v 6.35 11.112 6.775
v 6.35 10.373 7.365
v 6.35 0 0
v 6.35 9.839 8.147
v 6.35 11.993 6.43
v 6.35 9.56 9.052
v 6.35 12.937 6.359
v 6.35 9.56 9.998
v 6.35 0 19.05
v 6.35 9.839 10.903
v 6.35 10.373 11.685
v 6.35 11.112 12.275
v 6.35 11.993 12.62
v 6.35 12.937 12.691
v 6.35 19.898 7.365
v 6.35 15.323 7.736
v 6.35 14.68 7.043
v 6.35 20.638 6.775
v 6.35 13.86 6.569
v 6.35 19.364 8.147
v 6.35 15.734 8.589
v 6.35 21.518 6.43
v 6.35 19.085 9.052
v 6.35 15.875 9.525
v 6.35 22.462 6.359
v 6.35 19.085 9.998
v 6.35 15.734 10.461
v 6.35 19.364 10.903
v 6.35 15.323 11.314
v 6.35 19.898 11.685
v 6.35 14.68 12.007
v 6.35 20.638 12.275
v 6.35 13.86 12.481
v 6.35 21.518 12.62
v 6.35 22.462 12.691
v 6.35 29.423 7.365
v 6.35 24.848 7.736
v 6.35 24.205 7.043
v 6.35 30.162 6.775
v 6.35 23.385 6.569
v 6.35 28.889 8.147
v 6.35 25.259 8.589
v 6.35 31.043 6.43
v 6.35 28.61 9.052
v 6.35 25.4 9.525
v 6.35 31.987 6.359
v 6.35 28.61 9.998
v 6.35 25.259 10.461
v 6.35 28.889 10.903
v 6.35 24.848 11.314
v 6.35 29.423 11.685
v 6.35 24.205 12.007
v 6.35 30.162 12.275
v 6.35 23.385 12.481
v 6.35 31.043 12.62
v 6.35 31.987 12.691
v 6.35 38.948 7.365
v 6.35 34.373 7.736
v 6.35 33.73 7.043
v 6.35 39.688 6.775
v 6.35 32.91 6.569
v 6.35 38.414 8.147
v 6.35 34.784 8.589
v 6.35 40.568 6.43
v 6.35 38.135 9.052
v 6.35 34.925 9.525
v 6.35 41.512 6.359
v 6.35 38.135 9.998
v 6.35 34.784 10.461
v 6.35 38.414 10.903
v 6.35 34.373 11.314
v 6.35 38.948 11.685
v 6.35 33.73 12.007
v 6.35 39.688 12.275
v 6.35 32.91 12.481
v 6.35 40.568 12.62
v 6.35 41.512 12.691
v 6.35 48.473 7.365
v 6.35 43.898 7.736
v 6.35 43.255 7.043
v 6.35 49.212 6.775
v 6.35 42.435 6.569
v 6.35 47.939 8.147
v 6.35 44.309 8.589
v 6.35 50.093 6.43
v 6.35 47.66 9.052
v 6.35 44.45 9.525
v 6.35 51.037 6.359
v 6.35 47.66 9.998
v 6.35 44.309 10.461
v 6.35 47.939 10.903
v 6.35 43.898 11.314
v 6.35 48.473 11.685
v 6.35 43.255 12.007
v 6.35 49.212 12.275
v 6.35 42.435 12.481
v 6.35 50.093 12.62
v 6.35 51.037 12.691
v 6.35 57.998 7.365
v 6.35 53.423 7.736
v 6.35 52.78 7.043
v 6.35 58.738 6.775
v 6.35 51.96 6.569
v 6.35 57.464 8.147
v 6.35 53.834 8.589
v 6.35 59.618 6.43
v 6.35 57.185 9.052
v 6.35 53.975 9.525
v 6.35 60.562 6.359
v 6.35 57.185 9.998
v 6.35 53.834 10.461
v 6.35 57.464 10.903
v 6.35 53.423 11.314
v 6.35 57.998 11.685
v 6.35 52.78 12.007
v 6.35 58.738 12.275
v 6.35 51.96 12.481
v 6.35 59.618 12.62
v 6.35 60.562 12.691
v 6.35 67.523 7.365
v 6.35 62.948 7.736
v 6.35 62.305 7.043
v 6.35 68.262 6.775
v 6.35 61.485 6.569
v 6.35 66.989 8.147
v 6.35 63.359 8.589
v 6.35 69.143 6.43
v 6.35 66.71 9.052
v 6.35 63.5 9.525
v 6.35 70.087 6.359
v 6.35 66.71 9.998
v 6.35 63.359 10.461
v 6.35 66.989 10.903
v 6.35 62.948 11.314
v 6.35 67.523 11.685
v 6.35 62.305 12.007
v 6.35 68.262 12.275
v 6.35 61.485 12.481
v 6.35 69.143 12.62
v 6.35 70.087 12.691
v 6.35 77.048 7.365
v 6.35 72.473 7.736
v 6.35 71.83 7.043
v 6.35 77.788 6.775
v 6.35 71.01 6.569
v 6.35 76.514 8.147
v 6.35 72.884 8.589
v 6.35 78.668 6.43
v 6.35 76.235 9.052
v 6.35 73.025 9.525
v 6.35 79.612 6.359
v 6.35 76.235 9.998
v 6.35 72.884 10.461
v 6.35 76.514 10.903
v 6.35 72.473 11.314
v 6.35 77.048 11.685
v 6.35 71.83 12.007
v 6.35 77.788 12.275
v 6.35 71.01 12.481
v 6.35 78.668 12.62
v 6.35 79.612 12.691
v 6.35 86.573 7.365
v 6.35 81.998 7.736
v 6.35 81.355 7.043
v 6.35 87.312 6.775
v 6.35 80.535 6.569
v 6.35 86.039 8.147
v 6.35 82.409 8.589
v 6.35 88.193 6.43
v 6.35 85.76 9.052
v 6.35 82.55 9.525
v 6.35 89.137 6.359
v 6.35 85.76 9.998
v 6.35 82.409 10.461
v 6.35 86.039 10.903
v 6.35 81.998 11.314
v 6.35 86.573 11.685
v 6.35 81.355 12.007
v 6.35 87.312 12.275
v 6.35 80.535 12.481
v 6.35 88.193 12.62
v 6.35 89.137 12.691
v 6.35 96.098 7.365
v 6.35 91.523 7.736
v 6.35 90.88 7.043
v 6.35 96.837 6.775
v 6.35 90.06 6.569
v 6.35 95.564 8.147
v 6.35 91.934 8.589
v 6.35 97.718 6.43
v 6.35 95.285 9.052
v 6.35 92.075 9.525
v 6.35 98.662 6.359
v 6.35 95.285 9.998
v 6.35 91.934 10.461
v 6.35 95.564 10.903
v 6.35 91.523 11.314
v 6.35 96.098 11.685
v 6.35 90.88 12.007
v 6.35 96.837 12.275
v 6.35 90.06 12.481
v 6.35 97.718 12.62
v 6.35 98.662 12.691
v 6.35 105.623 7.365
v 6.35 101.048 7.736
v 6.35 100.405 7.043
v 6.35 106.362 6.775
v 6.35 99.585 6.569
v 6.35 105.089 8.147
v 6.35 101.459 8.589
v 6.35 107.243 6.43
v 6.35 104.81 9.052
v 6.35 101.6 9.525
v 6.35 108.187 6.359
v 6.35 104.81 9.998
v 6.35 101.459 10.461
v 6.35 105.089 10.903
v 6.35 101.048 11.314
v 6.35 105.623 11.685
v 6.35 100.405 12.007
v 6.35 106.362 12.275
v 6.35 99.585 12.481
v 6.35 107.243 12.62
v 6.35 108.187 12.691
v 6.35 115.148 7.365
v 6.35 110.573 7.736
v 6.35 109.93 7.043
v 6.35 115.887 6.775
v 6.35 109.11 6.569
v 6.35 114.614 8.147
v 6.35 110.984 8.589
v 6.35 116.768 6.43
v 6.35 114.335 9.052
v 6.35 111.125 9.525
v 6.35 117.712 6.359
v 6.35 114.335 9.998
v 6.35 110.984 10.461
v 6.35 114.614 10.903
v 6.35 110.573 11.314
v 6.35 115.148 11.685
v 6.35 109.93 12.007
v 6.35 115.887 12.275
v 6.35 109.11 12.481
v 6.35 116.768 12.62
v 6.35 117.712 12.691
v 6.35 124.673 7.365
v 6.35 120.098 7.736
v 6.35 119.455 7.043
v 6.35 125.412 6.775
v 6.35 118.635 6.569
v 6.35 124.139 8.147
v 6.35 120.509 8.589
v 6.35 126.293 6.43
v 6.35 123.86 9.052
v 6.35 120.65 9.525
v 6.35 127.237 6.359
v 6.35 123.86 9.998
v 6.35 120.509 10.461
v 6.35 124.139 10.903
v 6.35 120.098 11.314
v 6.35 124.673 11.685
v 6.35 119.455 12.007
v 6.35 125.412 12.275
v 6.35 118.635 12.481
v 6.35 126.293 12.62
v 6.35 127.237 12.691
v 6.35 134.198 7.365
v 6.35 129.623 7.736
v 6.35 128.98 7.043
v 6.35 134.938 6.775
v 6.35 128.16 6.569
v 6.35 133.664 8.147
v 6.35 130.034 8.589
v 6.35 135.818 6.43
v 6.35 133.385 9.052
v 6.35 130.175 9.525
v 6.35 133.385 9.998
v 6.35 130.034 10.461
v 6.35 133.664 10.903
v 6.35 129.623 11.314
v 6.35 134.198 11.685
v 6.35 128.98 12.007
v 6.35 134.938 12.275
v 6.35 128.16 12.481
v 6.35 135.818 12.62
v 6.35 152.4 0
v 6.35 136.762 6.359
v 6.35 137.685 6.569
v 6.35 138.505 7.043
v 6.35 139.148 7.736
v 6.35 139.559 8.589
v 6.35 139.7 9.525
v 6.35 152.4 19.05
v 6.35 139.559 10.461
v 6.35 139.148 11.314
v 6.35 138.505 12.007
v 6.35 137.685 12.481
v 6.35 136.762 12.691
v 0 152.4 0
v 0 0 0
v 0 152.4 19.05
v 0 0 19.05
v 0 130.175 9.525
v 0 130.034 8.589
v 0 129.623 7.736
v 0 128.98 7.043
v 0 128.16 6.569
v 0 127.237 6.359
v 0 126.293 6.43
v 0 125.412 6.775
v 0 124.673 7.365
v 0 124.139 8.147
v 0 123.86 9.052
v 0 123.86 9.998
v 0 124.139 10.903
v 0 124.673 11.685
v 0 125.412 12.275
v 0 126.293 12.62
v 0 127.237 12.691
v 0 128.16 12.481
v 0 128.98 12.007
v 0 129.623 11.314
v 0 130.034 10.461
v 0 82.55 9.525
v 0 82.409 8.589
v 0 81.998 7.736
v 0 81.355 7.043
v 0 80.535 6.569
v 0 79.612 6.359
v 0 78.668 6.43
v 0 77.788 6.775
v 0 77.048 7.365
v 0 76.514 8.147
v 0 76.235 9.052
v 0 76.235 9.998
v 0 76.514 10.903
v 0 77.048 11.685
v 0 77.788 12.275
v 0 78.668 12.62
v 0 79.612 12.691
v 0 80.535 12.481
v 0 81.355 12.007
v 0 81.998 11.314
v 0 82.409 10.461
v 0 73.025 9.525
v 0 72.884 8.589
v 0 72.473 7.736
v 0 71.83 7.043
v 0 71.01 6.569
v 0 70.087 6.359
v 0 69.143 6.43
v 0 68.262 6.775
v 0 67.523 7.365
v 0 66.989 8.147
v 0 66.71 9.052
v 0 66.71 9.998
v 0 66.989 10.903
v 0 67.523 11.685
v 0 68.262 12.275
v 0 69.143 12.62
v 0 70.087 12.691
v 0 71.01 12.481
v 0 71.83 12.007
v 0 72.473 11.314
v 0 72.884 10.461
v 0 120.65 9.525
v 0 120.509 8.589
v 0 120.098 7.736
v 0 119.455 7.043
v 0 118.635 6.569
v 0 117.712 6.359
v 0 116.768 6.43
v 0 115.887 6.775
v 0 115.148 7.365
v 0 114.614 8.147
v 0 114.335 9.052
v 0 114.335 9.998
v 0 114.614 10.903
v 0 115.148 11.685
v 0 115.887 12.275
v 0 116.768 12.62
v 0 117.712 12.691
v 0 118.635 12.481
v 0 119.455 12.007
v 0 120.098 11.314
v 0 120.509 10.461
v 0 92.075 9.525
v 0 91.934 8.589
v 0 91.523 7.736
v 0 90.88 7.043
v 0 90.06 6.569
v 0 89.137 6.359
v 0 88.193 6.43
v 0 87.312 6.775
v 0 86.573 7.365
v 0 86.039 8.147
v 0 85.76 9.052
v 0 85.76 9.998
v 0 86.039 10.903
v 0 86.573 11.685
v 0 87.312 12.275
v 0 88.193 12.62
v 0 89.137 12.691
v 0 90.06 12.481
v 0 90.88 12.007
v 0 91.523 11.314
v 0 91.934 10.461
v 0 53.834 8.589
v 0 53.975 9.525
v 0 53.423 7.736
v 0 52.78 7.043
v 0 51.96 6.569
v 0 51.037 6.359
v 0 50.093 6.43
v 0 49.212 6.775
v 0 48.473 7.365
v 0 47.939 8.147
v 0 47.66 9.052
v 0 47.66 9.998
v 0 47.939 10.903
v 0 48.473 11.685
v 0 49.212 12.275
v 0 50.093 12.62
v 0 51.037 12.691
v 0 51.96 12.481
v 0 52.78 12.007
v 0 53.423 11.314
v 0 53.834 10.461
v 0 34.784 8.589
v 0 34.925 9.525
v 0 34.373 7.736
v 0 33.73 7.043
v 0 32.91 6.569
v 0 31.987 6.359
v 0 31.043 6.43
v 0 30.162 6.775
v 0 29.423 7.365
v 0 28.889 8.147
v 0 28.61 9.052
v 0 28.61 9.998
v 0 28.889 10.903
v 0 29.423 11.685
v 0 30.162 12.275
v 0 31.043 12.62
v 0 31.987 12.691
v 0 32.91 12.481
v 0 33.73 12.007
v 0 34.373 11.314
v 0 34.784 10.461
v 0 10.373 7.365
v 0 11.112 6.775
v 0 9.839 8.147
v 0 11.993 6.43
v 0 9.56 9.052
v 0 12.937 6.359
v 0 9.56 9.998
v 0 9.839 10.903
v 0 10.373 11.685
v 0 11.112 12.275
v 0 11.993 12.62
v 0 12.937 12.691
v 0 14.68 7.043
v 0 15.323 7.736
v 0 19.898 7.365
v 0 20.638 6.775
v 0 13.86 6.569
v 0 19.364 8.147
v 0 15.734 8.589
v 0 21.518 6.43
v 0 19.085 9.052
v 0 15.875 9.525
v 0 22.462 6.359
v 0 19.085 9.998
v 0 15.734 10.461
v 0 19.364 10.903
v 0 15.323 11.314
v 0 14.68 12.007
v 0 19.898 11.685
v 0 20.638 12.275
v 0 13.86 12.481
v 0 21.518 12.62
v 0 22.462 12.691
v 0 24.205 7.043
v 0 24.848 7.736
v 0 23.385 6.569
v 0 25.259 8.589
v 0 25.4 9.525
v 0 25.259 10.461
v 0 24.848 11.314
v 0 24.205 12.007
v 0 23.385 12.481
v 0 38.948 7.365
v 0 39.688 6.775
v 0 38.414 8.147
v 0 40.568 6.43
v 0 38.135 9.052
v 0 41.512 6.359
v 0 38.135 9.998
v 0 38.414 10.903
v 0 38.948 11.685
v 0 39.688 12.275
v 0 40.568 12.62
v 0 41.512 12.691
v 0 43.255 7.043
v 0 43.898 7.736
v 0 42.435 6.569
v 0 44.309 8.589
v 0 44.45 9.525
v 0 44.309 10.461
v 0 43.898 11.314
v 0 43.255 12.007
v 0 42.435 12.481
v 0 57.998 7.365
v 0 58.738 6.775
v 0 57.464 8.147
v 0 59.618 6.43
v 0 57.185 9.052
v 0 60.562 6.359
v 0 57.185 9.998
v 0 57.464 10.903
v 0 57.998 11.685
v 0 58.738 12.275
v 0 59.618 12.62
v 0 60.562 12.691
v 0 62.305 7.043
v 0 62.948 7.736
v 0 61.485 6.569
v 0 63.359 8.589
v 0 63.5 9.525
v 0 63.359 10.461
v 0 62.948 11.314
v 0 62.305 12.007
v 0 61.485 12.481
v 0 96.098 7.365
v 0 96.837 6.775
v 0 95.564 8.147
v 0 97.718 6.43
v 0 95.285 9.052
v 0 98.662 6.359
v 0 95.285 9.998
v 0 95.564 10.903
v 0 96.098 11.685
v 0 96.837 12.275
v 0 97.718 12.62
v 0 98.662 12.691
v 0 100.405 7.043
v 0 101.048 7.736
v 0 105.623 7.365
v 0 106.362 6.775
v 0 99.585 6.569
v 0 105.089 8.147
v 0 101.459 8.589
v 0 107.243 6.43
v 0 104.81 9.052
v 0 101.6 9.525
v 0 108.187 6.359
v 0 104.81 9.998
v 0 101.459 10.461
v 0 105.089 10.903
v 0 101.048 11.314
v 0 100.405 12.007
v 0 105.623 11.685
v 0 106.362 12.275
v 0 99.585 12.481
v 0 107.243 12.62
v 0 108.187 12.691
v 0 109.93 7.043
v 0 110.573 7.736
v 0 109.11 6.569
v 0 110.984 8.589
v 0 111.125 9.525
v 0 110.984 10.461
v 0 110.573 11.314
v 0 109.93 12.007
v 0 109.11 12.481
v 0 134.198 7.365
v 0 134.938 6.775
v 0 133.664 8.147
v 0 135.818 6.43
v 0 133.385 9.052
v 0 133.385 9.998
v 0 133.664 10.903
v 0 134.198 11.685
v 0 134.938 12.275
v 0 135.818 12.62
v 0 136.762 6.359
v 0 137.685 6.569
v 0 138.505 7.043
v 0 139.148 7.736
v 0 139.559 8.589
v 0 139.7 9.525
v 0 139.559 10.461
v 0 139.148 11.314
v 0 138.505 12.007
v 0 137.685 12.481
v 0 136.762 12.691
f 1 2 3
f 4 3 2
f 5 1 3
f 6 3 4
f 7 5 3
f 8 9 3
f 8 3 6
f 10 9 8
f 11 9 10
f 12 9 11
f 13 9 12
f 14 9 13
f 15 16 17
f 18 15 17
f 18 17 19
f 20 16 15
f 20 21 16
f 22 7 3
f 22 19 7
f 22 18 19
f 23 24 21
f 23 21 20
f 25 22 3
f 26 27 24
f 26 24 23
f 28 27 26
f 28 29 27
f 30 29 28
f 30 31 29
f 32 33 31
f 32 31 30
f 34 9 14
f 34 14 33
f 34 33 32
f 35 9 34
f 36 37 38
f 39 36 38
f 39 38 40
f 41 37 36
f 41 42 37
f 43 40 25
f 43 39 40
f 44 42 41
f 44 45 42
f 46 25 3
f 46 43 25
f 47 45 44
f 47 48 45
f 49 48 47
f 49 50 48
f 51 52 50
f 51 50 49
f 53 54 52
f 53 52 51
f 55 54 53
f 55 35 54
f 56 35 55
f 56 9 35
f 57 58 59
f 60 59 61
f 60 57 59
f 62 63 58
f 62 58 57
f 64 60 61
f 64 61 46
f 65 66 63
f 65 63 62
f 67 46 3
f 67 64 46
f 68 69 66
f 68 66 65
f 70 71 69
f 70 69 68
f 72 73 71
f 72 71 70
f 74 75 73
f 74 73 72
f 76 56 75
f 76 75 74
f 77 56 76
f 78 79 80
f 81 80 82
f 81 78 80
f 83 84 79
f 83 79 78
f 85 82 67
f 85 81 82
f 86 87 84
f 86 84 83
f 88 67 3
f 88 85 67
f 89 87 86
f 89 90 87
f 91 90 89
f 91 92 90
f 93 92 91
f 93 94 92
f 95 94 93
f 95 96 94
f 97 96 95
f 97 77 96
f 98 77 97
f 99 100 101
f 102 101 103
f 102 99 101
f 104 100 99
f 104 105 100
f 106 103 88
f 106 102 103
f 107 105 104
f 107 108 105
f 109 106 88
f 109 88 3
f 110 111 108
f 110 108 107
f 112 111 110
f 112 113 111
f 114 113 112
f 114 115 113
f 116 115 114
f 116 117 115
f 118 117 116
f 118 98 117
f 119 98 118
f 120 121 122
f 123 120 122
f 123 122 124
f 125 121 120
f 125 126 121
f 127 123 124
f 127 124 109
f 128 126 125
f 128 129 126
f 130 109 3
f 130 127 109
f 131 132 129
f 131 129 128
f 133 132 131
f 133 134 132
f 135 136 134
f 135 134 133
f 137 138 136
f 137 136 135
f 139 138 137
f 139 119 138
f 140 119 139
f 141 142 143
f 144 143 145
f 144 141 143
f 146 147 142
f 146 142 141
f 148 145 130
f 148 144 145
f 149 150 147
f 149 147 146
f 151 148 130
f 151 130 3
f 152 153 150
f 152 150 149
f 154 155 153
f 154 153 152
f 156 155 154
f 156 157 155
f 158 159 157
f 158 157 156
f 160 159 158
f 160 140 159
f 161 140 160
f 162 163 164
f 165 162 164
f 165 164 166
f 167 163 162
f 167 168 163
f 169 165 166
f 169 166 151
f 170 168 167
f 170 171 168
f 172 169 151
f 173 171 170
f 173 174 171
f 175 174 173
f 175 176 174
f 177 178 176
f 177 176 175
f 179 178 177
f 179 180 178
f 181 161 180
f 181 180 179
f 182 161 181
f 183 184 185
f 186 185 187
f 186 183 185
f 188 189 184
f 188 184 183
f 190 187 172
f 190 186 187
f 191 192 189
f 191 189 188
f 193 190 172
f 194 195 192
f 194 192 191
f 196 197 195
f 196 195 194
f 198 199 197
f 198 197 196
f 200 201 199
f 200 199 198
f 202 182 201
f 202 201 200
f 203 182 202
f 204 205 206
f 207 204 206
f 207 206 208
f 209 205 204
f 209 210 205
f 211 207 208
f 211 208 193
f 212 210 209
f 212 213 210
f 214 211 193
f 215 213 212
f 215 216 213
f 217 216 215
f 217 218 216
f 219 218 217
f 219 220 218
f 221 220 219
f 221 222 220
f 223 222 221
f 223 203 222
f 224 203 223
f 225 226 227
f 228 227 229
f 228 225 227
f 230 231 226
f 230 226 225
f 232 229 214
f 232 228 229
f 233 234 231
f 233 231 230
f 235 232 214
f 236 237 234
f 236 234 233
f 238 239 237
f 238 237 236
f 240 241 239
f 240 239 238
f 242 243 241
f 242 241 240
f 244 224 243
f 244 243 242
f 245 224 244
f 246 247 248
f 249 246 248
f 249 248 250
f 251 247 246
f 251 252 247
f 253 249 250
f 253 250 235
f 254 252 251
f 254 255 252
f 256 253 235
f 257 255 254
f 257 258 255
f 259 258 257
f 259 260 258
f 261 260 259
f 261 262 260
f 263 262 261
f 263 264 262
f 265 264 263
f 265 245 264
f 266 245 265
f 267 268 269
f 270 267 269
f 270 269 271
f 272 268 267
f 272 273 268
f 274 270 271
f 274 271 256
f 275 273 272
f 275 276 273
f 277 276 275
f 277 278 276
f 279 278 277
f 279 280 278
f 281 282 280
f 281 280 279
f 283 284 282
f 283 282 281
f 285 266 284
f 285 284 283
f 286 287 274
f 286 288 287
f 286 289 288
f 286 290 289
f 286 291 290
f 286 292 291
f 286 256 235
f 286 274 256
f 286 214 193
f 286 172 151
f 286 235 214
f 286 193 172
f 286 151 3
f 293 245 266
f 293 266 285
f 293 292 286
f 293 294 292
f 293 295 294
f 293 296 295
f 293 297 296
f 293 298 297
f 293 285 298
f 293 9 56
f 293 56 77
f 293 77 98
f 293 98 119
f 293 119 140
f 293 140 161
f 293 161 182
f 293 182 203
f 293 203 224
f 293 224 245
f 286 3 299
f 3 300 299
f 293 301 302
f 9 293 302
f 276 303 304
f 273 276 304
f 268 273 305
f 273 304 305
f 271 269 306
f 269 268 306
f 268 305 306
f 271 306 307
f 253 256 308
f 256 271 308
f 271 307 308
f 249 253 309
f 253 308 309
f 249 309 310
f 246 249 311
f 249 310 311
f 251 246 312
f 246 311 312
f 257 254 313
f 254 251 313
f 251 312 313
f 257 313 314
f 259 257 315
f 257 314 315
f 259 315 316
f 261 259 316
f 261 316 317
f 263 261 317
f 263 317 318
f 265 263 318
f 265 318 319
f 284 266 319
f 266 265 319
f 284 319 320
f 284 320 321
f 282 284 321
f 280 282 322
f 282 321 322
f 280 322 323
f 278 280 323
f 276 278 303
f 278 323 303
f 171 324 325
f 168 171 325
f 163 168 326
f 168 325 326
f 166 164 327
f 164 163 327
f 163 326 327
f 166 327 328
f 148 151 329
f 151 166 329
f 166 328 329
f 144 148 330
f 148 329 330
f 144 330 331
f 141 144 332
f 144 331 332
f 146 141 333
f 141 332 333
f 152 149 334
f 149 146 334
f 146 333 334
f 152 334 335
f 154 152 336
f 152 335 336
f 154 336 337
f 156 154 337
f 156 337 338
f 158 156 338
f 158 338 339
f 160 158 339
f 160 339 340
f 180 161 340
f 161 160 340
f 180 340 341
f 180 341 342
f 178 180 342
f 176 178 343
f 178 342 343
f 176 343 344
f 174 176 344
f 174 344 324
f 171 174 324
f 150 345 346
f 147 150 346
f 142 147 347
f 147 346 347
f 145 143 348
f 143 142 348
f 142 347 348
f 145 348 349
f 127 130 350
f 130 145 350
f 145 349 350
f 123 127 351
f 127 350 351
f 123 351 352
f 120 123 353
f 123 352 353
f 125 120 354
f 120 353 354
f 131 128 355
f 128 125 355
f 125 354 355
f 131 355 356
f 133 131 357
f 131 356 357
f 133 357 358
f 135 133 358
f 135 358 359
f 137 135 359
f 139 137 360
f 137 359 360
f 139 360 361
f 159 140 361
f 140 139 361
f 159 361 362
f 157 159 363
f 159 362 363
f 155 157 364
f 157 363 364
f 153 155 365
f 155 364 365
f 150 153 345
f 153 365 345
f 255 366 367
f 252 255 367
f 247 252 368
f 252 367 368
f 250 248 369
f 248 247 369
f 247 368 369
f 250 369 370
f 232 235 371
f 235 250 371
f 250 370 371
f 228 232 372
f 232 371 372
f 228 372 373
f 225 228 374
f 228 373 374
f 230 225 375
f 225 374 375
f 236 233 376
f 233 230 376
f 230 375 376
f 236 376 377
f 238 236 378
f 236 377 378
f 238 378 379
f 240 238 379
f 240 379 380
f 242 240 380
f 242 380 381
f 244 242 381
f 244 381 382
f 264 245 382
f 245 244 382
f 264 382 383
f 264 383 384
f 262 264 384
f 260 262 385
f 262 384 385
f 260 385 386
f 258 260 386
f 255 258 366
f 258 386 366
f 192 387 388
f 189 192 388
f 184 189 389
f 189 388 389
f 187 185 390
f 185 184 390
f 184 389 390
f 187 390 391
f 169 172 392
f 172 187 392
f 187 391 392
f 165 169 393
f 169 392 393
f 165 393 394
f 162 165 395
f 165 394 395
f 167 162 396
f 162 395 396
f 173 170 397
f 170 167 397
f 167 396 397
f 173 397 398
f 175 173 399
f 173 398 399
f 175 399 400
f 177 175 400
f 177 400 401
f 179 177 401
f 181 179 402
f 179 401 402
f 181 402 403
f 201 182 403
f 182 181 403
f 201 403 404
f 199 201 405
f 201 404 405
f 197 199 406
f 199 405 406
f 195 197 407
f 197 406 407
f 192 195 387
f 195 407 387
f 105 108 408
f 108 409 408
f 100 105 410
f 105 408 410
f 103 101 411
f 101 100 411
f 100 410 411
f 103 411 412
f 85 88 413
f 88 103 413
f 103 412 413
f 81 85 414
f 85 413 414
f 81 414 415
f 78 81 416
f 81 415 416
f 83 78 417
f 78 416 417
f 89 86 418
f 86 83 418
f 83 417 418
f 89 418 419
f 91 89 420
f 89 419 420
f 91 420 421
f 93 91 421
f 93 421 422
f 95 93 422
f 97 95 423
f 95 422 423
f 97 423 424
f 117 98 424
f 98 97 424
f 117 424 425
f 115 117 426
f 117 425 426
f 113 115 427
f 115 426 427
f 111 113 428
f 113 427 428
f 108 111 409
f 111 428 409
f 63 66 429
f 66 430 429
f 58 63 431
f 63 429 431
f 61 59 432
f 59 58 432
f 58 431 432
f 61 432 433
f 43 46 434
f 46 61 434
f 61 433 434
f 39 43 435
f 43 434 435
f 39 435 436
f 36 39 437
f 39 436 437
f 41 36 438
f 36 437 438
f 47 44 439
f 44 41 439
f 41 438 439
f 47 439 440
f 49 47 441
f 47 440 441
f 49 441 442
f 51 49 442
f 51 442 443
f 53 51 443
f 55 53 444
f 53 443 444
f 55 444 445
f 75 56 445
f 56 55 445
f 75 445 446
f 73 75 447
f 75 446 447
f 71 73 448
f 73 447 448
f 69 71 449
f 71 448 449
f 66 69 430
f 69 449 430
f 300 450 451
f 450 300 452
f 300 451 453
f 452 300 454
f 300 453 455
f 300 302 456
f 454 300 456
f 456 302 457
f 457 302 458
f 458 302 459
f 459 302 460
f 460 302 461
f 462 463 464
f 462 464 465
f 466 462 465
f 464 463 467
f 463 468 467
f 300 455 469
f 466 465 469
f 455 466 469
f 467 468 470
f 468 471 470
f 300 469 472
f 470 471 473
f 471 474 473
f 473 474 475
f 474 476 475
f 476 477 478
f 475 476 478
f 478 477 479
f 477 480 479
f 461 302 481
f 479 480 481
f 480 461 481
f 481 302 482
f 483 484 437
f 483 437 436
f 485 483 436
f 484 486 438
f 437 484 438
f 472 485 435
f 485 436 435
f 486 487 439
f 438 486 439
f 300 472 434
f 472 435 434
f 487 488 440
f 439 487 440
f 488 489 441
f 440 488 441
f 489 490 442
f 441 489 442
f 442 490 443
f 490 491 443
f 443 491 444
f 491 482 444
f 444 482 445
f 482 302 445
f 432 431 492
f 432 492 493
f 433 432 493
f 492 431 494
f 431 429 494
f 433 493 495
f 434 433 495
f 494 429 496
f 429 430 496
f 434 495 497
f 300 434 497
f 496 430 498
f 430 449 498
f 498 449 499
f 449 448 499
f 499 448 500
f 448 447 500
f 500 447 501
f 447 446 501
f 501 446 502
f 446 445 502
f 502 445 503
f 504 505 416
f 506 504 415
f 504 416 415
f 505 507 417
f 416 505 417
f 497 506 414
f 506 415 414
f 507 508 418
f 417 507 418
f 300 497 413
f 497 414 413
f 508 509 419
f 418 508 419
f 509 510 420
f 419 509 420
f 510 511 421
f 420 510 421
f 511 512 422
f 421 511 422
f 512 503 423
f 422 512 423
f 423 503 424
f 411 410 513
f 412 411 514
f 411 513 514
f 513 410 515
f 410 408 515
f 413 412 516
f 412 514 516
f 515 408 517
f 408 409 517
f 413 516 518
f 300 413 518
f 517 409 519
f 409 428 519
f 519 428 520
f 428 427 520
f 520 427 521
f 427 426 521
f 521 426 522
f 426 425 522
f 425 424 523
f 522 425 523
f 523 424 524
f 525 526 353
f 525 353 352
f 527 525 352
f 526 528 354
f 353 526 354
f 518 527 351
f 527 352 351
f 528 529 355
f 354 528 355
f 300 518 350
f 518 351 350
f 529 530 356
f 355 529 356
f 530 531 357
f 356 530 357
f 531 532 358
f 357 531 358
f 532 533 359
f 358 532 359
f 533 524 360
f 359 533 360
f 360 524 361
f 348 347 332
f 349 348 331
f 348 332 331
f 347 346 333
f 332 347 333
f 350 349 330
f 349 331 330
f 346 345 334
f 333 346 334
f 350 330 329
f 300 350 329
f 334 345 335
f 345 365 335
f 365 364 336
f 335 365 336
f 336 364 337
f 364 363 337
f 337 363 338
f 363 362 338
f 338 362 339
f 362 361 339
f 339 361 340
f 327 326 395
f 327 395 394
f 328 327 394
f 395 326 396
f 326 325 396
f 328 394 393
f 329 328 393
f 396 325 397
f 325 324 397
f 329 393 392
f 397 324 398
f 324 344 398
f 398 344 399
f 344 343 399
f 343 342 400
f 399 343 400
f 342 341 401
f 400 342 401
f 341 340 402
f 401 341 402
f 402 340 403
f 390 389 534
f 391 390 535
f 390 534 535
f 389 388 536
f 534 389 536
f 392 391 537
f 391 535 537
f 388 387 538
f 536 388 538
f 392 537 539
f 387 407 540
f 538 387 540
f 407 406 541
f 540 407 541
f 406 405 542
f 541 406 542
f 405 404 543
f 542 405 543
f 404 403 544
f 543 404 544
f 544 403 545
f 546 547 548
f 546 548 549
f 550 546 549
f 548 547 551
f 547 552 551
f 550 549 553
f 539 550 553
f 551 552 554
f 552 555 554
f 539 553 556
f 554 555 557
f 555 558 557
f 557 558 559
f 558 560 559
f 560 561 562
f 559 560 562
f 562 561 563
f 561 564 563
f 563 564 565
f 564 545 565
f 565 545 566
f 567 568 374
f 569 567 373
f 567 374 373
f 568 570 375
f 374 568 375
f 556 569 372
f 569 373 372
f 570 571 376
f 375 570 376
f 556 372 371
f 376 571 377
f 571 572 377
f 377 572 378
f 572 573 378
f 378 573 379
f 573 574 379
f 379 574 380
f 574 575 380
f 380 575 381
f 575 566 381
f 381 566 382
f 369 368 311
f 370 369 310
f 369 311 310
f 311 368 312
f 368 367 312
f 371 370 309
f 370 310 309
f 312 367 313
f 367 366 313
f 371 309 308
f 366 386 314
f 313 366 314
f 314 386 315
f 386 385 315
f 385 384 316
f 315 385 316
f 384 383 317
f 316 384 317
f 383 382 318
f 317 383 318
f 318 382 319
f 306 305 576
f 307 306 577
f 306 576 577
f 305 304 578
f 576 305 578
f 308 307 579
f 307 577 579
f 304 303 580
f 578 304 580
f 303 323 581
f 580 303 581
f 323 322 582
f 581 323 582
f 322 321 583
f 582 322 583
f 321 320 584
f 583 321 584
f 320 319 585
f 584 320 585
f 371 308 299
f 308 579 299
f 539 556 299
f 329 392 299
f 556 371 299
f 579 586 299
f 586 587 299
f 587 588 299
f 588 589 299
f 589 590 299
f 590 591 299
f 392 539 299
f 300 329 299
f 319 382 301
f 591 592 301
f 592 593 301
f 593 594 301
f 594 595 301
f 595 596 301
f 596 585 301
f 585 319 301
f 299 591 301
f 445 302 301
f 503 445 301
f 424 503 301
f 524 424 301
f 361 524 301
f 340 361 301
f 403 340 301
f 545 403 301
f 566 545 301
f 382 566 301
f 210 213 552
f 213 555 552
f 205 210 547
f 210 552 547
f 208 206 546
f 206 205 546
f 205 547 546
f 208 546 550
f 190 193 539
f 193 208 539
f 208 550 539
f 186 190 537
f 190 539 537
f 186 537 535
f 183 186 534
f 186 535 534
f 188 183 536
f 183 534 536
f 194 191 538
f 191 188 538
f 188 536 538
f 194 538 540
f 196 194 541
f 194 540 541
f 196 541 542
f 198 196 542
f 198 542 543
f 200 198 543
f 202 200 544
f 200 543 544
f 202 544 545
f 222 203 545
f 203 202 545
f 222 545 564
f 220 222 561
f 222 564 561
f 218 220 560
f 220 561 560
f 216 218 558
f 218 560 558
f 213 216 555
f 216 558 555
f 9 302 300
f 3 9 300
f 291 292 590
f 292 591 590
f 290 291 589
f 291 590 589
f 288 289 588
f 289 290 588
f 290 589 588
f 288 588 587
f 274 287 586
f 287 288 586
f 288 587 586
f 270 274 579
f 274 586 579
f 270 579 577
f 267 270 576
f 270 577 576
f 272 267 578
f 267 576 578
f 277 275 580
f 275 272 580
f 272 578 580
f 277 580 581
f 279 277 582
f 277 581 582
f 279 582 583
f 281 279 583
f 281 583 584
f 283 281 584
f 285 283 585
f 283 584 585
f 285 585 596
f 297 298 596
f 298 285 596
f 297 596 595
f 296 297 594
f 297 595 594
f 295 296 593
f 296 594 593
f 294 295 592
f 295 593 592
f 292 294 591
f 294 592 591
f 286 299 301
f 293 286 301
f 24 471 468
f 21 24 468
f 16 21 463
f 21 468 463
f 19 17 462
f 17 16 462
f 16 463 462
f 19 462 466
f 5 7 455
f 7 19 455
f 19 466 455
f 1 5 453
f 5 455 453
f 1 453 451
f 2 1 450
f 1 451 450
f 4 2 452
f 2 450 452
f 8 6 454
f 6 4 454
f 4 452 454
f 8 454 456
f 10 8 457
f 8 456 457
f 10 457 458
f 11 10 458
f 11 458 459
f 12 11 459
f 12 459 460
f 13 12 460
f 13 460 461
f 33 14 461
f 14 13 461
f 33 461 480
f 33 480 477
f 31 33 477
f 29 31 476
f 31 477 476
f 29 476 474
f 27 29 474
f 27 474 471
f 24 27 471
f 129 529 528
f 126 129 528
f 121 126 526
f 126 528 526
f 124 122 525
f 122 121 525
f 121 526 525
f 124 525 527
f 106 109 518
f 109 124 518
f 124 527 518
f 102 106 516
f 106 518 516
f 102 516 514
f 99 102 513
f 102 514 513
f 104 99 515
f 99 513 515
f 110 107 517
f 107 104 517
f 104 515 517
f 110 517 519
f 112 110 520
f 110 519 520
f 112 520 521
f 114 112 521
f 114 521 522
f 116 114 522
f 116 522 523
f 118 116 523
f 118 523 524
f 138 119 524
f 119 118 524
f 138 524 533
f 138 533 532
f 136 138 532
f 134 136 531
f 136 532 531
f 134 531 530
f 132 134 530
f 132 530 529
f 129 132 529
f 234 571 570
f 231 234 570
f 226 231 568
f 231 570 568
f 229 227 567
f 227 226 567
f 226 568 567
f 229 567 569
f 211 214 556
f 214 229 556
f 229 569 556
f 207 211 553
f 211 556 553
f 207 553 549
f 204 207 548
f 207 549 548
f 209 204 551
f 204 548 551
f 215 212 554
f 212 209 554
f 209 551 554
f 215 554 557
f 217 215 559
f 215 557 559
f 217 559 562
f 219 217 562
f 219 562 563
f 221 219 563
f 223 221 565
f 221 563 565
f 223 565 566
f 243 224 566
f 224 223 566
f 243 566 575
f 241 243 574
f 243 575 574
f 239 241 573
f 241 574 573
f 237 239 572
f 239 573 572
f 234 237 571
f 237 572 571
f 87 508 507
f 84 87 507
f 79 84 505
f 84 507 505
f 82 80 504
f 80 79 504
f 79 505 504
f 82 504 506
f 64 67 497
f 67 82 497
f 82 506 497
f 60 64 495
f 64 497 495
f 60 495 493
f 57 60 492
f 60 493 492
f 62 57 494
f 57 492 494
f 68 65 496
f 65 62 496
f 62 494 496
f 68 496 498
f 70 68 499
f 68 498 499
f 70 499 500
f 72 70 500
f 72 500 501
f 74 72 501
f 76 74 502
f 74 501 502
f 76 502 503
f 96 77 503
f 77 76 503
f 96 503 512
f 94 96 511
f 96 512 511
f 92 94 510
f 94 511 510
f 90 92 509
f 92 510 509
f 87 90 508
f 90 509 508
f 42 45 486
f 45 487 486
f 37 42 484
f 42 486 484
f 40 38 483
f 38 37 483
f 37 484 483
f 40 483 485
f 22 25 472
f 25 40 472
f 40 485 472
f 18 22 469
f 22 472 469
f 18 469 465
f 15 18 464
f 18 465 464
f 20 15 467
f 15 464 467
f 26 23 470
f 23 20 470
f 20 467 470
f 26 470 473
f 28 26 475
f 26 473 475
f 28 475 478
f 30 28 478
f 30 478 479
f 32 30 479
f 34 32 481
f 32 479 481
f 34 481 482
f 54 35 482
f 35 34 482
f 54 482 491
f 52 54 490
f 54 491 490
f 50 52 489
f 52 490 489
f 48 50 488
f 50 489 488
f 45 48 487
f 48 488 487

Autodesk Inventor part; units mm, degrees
ref_plane "YZ Plane" through (0, 0, 0) normal (1, 0, 0) x (0, 1, 0)
ref_plane "XZ Plane" through (0, 0, 0) normal (0, 1, 0) x (-1, 0, 0)
ref_plane "XY Plane" through (0, 0, 0) normal (0, 0, 1) x (1, 0, 0)
sketch "Sketch1" plane through (0, 0, 0) normal (1, 0, 0) x (0, 1, 0)
  line L0 (0, 0) -> (152.4, 0)
  line L1 (152.4, 0) -> (152.4, 19.05)
  line L2 (152.4, 19.05) -> (0, 19.05)
  line L3 (0, 19.05) -> (0, 0)
  circle A0 centre (12.7, 9.525) radius 3.175
  circle A1 centre (22.225, 9.525) radius 3.175
  circle A2 centre (31.75, 9.525) radius 3.175
  circle A3 centre (41.275, 9.525) radius 3.175
  circle A4 centre (50.8, 9.525) radius 3.175
  circle A5 centre (60.325, 9.525) radius 3.175
  circle A6 centre (69.85, 9.525) radius 3.175
  circle A7 centre (79.375, 9.525) radius 3.175
  circle A8 centre (88.9, 9.525) radius 3.175
  circle A9 centre (98.425, 9.525) radius 3.175
  circle A10 centre (107.95, 9.525) radius 3.175
  circle A11 centre (117.475, 9.525) radius 3.175
  circle A12 centre (127, 9.525) radius 3.175
  circle A13 centre (136.525, 9.525) radius 3.175
  dimension "d0" = 19.05
  dimension "d1" = 152.4
  dimension "d2" = 6.35
  dimension "d3" = 12.7
  dimension "d4" = 9.525
  dimension "d7" = 9.525
extrude "Extrusion1" add sketch "Sketch1" along normal blind 6.35
properties part number "Handle-Cart Link"
